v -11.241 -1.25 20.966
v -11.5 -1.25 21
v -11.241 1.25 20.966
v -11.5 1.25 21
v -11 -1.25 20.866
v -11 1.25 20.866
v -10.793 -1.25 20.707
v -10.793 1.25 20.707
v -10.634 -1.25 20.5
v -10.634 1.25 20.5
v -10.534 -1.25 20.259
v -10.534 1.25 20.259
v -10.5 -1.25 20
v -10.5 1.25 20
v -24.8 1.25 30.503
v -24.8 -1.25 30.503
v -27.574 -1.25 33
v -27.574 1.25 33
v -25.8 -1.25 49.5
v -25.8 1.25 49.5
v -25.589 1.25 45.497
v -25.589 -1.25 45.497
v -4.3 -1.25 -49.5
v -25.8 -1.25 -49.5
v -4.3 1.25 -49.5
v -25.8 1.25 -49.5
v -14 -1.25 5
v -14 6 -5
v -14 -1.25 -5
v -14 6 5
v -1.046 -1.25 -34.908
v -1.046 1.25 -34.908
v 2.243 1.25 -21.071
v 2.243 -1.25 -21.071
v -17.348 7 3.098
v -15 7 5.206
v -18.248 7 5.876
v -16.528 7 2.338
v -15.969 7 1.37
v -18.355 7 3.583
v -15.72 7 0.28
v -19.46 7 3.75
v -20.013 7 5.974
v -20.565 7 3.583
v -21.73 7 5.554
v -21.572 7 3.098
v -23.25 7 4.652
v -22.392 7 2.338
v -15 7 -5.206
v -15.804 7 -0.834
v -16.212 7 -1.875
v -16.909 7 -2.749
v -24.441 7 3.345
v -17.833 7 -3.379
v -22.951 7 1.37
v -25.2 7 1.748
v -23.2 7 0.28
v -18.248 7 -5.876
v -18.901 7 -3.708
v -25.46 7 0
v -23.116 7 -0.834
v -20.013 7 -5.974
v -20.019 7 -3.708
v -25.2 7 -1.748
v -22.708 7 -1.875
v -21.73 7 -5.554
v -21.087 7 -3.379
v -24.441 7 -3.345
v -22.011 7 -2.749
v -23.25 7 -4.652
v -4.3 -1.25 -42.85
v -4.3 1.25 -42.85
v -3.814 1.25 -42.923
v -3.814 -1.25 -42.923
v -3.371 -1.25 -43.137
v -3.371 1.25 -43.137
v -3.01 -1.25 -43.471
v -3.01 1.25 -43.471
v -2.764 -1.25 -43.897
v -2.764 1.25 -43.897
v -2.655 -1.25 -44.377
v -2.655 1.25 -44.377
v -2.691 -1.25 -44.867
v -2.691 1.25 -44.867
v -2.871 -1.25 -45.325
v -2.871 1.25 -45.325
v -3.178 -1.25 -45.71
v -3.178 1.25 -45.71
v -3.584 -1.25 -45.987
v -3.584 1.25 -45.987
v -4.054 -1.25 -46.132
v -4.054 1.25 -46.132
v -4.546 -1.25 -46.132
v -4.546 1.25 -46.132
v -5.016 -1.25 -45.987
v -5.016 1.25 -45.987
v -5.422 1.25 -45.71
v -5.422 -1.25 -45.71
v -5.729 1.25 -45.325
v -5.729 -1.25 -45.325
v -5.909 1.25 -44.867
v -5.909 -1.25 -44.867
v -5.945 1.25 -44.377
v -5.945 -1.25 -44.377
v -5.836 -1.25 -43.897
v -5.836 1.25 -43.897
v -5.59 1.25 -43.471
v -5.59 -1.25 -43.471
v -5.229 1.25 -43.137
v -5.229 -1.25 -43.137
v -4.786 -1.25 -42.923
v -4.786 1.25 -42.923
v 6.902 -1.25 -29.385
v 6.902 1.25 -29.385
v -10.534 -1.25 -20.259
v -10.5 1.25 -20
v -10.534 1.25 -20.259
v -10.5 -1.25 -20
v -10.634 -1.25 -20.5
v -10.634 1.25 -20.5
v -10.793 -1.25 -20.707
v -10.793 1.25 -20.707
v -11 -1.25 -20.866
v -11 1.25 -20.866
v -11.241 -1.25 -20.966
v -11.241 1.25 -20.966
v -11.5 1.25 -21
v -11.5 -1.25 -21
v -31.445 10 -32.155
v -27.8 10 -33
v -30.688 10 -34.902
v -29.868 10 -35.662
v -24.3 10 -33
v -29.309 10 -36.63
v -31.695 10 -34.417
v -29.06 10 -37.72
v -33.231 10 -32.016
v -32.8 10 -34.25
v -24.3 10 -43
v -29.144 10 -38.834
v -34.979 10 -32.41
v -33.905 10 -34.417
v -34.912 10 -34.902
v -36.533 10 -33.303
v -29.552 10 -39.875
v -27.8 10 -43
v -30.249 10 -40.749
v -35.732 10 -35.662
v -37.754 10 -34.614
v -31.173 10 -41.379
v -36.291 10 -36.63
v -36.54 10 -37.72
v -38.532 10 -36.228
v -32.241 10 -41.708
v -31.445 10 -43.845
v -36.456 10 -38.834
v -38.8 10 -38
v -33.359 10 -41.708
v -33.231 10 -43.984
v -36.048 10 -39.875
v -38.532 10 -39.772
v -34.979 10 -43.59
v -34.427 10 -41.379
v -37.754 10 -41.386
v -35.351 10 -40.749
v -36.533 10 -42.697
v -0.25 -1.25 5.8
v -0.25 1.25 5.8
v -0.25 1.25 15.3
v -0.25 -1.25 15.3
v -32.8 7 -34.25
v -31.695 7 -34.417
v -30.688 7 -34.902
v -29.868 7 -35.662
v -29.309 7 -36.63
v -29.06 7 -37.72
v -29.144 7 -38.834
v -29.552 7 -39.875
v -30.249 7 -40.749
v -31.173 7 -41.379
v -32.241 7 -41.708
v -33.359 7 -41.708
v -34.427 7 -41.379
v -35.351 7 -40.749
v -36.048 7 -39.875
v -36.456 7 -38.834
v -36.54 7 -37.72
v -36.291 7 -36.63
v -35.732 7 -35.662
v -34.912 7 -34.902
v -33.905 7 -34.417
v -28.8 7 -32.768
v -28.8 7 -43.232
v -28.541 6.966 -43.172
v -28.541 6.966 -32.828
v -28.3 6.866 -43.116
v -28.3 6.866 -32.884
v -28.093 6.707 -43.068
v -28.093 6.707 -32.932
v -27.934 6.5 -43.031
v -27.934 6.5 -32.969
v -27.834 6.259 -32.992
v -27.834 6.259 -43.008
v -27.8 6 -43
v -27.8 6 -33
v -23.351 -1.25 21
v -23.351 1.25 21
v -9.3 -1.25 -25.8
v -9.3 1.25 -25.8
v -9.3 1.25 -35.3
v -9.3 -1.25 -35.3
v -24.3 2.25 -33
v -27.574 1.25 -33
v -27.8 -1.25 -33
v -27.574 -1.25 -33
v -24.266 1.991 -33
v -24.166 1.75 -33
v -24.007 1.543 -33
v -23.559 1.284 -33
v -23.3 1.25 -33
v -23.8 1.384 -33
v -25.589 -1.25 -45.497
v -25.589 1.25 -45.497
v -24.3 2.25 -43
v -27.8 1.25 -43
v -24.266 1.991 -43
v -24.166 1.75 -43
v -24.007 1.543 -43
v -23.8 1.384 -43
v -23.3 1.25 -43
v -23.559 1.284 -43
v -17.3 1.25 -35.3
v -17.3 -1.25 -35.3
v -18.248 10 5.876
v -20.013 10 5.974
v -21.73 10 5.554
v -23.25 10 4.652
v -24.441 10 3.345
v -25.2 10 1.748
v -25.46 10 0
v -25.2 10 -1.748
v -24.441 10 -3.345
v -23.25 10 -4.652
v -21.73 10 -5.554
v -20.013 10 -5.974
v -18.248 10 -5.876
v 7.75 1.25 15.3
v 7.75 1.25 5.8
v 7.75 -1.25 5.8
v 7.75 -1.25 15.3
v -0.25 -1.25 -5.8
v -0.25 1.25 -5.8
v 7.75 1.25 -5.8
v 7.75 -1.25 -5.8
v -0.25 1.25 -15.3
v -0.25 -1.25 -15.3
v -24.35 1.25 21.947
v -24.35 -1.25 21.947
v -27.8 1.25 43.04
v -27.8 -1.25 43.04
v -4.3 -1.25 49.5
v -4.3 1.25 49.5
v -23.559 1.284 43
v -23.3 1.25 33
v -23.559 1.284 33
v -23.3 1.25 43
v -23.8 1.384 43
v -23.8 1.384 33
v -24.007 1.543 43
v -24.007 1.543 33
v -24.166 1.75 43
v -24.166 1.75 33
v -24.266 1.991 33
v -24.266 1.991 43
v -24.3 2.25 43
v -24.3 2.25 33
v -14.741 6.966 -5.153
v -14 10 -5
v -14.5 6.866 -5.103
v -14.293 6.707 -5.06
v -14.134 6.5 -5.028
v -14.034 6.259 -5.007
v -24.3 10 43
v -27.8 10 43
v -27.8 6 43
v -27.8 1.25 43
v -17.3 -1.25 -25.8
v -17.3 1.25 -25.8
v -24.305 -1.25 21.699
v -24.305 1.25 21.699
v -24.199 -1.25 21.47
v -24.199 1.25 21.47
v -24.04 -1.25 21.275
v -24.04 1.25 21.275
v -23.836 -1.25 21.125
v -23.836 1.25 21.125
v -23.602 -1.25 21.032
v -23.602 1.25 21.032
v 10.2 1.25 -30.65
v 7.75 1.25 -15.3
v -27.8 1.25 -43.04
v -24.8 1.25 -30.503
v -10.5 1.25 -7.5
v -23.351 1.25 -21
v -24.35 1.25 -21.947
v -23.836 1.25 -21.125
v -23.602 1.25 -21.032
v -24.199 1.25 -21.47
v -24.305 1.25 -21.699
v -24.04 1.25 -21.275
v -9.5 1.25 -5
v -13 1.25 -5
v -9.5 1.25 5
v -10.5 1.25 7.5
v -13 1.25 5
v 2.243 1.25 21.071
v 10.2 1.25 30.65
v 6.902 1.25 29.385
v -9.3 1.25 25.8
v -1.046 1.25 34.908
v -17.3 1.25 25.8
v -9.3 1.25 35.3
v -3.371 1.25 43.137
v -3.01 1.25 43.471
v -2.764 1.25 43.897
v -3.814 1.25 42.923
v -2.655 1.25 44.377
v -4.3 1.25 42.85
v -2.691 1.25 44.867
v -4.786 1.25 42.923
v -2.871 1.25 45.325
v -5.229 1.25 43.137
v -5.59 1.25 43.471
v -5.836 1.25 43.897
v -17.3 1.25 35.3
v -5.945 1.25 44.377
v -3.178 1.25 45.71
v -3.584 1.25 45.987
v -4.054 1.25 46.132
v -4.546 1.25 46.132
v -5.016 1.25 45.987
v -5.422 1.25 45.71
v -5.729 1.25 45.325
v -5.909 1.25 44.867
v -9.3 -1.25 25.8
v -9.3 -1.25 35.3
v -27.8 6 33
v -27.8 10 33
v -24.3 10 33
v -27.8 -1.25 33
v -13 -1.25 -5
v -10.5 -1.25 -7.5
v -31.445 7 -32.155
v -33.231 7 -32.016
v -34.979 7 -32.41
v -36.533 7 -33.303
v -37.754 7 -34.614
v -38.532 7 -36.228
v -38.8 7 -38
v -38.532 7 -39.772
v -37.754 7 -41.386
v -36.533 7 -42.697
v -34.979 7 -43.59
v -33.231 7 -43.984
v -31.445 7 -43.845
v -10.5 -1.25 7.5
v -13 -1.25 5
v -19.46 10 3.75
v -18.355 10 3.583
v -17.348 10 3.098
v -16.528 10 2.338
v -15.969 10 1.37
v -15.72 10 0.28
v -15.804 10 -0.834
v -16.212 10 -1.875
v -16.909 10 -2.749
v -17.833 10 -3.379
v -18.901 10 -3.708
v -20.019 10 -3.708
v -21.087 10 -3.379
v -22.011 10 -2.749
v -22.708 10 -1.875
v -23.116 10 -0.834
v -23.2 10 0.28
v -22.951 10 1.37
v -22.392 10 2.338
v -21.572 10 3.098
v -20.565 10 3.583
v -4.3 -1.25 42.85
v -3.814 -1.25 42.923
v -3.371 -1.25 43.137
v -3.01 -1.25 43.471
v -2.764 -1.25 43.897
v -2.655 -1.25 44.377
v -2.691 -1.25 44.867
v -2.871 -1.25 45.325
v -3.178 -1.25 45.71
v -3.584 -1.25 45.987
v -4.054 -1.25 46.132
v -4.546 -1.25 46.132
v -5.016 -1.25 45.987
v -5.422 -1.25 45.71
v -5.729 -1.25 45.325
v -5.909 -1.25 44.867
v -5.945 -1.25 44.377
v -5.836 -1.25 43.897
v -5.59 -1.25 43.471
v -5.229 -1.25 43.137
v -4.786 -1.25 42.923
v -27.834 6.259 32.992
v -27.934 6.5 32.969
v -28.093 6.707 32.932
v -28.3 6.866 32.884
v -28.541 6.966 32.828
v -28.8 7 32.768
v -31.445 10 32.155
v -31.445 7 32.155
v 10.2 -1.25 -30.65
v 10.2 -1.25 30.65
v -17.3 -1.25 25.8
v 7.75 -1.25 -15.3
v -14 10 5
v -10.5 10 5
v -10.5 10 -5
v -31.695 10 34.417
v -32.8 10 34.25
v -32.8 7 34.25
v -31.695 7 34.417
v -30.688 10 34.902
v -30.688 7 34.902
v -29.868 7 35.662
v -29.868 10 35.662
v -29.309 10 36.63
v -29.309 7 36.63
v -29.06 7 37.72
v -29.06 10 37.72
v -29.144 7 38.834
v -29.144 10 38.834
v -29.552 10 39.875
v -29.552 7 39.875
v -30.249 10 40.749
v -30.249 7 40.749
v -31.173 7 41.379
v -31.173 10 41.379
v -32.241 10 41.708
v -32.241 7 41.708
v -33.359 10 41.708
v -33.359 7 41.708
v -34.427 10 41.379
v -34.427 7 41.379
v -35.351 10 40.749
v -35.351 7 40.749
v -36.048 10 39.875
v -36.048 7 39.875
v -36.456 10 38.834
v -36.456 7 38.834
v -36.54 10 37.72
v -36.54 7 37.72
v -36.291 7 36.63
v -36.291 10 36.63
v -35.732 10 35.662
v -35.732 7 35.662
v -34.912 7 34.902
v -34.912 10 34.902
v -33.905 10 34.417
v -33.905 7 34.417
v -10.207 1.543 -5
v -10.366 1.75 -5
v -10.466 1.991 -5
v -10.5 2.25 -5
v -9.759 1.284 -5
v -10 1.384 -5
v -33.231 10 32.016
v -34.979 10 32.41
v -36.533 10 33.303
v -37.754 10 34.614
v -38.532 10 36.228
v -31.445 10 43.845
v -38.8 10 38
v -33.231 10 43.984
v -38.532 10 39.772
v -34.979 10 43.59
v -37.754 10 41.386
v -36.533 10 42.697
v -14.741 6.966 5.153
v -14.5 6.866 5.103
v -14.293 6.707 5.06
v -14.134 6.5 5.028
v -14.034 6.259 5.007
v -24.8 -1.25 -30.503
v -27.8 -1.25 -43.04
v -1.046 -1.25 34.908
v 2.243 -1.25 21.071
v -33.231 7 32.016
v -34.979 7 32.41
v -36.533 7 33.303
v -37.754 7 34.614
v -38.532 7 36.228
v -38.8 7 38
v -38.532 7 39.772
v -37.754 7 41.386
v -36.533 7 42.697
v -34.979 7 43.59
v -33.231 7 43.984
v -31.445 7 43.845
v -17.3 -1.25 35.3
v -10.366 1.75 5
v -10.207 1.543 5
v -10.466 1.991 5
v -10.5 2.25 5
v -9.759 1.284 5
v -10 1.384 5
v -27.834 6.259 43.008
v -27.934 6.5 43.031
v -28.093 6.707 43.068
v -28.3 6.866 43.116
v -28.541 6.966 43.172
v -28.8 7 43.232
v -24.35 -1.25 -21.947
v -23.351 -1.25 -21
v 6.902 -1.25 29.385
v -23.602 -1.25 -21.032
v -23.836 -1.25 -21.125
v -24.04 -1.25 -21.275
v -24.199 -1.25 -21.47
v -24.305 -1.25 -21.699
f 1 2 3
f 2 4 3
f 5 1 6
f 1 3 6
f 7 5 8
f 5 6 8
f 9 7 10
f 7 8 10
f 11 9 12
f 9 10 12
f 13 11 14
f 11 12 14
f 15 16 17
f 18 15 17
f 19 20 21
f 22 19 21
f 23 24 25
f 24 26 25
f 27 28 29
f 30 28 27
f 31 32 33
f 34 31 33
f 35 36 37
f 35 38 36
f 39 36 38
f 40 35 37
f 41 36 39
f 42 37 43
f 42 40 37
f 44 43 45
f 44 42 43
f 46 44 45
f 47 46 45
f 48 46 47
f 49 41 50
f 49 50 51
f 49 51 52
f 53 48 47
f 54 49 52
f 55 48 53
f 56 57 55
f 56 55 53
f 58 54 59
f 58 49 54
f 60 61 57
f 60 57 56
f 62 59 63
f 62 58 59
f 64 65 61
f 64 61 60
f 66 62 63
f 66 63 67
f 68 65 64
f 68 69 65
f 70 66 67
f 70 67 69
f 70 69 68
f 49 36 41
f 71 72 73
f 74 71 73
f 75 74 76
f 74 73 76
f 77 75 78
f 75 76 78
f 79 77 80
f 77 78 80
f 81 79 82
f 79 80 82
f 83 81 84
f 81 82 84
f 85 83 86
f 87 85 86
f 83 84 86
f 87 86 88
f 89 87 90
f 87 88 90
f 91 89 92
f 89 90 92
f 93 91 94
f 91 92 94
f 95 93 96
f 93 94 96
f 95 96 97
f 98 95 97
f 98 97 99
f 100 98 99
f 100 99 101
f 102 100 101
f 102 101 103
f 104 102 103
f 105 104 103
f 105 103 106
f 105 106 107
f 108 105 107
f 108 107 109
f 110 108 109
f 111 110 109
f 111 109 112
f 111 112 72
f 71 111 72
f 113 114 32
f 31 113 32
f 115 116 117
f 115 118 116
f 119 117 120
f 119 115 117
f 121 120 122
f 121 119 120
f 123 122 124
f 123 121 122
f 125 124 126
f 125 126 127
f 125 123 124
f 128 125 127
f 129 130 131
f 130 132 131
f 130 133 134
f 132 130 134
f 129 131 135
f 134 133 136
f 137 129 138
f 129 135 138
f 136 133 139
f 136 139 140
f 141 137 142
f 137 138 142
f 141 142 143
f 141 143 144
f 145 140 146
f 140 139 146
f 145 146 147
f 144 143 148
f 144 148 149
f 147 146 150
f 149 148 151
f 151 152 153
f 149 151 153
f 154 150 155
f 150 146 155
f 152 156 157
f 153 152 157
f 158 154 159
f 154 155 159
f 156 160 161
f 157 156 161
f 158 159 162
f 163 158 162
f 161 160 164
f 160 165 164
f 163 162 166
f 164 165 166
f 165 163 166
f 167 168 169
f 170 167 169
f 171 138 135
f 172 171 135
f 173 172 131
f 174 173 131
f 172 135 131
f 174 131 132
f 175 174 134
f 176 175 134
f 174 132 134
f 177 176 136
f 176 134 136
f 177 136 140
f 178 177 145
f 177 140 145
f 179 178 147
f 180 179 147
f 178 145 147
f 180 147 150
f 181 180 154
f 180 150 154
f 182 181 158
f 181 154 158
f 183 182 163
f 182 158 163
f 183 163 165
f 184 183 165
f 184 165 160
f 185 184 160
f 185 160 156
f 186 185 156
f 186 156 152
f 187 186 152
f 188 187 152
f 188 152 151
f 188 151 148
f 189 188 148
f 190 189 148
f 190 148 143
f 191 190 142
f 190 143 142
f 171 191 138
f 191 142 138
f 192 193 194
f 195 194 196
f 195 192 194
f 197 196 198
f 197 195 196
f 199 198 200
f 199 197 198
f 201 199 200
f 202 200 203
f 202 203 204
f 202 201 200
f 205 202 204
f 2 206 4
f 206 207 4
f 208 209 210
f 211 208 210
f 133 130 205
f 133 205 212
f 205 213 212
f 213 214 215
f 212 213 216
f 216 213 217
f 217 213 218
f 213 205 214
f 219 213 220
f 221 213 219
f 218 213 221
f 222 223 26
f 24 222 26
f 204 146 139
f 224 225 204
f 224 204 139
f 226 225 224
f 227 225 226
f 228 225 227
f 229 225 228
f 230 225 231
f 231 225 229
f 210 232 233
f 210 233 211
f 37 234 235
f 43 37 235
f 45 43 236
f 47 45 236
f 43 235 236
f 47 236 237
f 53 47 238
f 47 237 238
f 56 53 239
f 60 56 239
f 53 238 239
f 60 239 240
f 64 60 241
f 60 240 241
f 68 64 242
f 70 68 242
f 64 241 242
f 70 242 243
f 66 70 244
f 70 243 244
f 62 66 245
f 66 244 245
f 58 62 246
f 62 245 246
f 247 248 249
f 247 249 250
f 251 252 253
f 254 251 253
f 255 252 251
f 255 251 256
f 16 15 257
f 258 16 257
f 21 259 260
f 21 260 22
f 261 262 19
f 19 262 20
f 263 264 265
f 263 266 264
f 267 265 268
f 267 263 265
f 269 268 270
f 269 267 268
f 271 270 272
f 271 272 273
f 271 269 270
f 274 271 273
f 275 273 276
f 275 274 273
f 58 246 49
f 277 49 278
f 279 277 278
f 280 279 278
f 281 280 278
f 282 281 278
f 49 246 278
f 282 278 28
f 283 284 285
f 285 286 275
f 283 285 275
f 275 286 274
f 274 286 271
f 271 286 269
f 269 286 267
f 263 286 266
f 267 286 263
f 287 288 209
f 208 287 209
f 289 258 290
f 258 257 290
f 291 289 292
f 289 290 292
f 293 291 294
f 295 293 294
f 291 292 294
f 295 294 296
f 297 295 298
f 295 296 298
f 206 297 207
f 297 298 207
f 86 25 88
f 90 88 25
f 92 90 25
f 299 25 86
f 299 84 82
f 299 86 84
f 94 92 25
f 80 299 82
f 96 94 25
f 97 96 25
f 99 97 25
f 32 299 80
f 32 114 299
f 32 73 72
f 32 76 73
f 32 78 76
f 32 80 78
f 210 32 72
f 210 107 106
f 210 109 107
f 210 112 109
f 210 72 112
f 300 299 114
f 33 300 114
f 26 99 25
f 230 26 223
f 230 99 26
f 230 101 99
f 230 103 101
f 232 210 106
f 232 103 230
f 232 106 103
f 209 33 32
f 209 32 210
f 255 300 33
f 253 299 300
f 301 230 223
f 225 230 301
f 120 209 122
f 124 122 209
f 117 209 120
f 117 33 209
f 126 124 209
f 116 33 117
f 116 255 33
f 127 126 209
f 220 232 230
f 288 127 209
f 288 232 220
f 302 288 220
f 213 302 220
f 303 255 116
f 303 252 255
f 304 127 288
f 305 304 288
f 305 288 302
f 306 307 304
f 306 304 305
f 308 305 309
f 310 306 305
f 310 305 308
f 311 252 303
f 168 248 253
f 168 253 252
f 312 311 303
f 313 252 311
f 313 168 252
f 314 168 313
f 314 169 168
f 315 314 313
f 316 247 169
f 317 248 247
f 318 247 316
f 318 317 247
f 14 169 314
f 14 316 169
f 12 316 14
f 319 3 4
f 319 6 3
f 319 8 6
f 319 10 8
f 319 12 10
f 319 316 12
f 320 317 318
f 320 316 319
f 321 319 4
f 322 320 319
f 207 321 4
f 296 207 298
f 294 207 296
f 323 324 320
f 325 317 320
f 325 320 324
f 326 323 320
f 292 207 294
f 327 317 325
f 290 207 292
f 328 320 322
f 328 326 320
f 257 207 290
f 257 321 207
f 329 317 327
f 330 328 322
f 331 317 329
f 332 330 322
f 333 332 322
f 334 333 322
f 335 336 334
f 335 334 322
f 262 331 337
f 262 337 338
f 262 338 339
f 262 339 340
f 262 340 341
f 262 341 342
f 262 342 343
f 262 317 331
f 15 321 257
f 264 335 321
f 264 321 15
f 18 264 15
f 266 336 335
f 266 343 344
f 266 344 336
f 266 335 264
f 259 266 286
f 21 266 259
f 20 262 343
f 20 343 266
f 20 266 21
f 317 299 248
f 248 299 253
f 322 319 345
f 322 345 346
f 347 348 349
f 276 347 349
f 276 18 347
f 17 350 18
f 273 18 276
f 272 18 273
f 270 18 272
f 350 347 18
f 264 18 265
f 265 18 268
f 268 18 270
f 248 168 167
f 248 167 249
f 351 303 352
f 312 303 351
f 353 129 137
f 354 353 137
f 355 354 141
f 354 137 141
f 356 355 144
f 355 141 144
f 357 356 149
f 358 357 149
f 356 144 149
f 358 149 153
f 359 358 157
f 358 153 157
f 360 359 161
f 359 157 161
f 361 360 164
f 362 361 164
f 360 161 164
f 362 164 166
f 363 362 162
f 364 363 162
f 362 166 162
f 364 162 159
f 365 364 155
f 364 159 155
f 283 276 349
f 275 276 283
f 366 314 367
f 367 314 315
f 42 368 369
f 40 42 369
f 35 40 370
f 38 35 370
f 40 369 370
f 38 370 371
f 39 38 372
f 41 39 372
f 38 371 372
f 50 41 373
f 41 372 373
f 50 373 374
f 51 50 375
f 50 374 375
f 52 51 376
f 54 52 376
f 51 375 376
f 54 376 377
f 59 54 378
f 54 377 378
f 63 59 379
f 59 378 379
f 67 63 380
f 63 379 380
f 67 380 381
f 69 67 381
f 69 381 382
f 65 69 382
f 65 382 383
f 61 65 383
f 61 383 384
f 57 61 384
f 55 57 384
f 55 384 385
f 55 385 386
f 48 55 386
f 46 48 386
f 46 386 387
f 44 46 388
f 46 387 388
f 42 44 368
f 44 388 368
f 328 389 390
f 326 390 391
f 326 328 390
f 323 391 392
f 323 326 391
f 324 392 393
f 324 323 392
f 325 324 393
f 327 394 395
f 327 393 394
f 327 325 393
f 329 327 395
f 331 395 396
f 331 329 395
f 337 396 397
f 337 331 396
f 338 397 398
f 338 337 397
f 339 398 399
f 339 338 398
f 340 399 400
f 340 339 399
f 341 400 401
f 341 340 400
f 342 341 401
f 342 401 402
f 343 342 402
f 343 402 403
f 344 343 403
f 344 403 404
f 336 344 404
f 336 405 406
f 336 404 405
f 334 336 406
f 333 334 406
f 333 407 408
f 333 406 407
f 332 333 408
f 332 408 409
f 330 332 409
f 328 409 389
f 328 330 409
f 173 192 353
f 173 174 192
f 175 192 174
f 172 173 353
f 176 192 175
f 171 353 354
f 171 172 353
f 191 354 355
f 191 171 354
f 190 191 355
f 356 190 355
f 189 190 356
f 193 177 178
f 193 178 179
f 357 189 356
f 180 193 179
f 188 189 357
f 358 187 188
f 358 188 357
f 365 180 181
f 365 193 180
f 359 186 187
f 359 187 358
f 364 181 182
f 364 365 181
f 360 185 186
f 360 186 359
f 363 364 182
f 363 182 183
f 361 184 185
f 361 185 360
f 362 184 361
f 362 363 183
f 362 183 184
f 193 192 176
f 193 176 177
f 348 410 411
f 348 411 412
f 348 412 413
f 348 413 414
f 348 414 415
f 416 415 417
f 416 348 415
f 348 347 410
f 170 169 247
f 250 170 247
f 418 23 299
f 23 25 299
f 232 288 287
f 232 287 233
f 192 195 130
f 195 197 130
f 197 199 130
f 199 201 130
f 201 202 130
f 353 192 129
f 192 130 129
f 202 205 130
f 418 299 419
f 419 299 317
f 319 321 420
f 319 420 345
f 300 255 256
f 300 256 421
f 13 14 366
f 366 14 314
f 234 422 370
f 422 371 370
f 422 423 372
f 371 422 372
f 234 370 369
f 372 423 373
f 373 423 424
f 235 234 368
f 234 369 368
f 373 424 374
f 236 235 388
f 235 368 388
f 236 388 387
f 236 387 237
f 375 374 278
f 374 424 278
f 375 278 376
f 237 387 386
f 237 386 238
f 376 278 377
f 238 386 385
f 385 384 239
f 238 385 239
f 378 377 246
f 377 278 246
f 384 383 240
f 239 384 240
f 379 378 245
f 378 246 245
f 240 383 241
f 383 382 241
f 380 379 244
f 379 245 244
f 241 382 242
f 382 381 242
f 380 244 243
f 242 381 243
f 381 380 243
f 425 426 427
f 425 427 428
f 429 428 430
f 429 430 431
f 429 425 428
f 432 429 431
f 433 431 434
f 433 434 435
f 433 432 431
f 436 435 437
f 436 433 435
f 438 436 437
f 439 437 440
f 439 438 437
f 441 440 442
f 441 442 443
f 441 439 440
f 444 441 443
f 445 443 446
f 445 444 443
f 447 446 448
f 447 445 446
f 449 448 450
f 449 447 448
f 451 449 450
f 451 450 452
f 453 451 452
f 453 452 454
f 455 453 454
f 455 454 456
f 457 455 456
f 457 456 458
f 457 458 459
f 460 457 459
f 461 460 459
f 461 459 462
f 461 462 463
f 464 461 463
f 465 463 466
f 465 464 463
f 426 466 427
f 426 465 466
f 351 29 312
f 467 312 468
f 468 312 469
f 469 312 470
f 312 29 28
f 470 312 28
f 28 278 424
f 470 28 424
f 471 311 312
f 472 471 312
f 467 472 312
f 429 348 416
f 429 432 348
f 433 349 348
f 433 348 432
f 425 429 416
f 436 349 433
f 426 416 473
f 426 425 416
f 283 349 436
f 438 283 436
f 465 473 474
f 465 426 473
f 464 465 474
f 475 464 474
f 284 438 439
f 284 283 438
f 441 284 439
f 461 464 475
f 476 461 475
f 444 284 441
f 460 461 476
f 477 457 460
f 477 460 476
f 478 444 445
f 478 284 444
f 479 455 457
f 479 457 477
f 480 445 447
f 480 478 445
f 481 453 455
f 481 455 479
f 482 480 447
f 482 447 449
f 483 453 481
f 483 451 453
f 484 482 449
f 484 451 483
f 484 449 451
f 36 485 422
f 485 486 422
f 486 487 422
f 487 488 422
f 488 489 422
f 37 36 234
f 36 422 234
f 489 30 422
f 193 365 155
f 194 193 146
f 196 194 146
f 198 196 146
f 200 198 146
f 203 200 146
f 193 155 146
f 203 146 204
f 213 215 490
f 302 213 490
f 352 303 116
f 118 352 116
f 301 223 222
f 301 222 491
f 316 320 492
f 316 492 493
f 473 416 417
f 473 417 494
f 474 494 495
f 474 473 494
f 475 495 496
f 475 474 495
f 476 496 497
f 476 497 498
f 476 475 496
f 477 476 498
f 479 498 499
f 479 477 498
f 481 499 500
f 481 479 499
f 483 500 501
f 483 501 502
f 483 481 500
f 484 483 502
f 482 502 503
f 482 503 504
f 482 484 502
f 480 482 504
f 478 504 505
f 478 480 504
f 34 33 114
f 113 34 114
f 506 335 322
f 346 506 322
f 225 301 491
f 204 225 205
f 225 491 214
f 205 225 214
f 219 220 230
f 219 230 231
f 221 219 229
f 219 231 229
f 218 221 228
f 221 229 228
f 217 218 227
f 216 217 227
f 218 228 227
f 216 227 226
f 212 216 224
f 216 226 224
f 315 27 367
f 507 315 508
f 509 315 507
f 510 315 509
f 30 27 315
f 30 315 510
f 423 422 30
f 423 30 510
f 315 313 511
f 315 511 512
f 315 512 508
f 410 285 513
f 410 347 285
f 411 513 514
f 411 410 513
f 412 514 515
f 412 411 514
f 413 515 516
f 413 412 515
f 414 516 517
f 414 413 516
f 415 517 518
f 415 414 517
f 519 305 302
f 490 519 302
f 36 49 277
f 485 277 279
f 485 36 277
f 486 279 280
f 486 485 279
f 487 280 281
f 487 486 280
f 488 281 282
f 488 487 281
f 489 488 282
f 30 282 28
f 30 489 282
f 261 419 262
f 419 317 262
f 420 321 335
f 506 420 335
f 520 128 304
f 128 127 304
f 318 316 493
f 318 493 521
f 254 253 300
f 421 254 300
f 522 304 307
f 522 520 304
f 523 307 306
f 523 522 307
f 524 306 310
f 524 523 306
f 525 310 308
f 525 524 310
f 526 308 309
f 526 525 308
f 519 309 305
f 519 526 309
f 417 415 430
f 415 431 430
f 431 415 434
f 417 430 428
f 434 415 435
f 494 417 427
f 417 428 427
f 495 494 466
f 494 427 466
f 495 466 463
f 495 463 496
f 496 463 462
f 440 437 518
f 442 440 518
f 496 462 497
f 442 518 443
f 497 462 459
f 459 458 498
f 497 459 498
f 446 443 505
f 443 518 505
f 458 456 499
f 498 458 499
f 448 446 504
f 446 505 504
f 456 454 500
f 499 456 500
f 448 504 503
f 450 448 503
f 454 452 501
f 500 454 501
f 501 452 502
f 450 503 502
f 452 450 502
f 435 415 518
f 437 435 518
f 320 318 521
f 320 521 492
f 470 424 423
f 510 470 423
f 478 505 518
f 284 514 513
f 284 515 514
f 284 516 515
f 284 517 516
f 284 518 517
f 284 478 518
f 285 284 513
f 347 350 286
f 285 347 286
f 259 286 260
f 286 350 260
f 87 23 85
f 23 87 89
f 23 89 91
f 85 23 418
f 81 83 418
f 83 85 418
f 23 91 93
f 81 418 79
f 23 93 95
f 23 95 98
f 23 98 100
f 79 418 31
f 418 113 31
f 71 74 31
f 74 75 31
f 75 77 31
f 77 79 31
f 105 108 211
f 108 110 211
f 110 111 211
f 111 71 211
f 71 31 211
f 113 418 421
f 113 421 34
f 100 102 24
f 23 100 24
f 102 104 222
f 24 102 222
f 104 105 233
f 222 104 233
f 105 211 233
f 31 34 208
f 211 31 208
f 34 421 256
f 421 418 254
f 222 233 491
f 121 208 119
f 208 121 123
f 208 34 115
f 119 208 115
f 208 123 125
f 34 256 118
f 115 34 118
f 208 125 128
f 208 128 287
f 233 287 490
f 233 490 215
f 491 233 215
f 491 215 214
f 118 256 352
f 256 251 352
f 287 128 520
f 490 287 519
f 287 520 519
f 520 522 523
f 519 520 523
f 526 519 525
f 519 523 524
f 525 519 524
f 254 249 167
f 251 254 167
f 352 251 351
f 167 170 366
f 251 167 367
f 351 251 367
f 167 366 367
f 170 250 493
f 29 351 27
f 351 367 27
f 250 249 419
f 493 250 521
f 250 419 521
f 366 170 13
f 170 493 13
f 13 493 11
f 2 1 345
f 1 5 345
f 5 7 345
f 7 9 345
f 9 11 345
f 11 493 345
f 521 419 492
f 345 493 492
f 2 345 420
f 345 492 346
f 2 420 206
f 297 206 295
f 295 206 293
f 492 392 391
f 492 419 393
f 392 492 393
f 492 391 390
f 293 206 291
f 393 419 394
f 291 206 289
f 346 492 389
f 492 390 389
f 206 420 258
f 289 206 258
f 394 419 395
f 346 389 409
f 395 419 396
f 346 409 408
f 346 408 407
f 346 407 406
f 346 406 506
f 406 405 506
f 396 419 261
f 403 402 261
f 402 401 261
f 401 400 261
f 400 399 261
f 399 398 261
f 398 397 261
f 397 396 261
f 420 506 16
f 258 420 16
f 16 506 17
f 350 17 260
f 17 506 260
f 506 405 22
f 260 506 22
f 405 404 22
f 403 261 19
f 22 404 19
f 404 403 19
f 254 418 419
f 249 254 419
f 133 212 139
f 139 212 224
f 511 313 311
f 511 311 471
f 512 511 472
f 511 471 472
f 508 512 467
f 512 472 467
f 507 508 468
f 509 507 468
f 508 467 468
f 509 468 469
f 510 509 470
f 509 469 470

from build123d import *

# Parameters (mm, degrees)
RESSALTO_EXTRUS_O1_DEPTH = 1.25
ESBO_O8_R                = 1.65
ESBO_O8_W                = 8
ESBO_O8_H                = 9.5
CORTE_EXTRUS_O6_DEPTH    = 56.876112964
CORTE_EXTRUS_O5_DEPTH    = 10
RESSALTO_EXTRUS_O4_START = -1.25
ESBO_O12_W               = 3.5
ESBO_O12_H               = 10
RESSALTO_EXTRUS_O4_DEPTH = 11.25
ESBO_O13_R               = 3.75
RESSALTO_EXTRUS_O5_DEPTH = 3
RESSALTO_EXTRUS_O6_START = -11.25
ESBO_O14_W               = 3.5
ESBO_O14_H               = 10
RESSALTO_EXTRUS_O6_DEPTH = 11.25
ESBO_O15_R               = 3.75
RESSALTO_EXTRUS_O7_DEPTH = 3
CHANFRO1_SIZE            = 2.5
CHANFRO1_SIZE_2          = 2.378287199
CHANFRO1_SIZE_3          = 2.642541332
FILETE1_R                = 1


with BuildPart() as part:
    # Esboço1 → Ressalto-extrusão1 (new, symmetric)
    with BuildSketch(Plane(origin=(0, 0, 0), x_dir=(1, 0, 0), z_dir=(0, 1, 0))):
        Polygon((-10.5, -21), (-10.5, 21), (-24.3, 21), (-25.8, 49.5), (-4.3, 49.5), (10.2, 30.65), (10.2, -30.65), (-4.3, -49.5), (-25.8, -49.5), (-24.3, -21), align=None)
    extrude(amount=RESSALTO_EXTRUS_O1_DEPTH, both=True)

    # Esboço8 → Corte-extrusão6 (cut, through all)
    with BuildSketch(Plane(origin=(0, 1.25, 0), x_dir=(1, 0, 0), z_dir=(0, 1, 0))):
        with Locations(Location((-4.3, 44.5, 0), (0, 0, 270))):
            Circle(ESBO_O8_R)
        with Locations((-13.3, 30.55)):
            Rectangle(ESBO_O8_W, ESBO_O8_H)
        with Locations((3.75, 10.55)):
            Rectangle(ESBO_O8_W, ESBO_O8_H)
    corte_extrus_o6 = extrude(amount=-CORTE_EXTRUS_O6_DEPTH, mode=Mode.SUBTRACT)

    # Esboço9 → Corte-extrusão5 (cut)
    with BuildSketch(Plane(origin=(0, 1.25, 0), x_dir=(1, 0, 0), z_dir=(0, 1, 0))):
        Polygon((6.901537023, 29.384909169), (-1.046130524, 34.9078029), (2.24312, 21.07143213), align=None)
    corte_extrus_o5 = extrude(amount=-CORTE_EXTRUS_O5_DEPTH, mode=Mode.SUBTRACT)

    # Esboço12 → Ressalto-extrusão4 (add)
    with BuildSketch(Plane(origin=(0, 0, 0), x_dir=(1, 0, 0), z_dir=(0, 1, 0)).offset(RESSALTO_EXTRUS_O4_START)):
        with Locations((-26.05, 38)):
            Rectangle(ESBO_O12_W, ESBO_O12_H)
    ressalto_extrus_o4 = extrude(amount=RESSALTO_EXTRUS_O4_DEPTH)

    # Esboço13 → Ressalto-extrusão5 (add)
    with BuildSketch(Plane(origin=(0, 10, 0), x_dir=(1, 0, 0), z_dir=(0, 1, 0))):
        with BuildLine():
            Line((-31.444994432, 43.844994432), (-27.8, 43))
            Line((-27.8, 43), (-27.8, 33))
            Line((-27.8, 33), (-31.444994432, 32.155005568))
            ThreePointArc((-31.444994432, 32.155005568), (-38.8, 38), (-31.444994432, 43.844994432))
        make_face()
        with Locations(Location((-32.8, 38, 0), (0, 0, 270))):
            Circle(ESBO_O13_R, mode=Mode.SUBTRACT)
    ressalto_extrus_o5 = extrude(amount=-RESSALTO_EXTRUS_O5_DEPTH)

    # Espelhar1: Corte-extrusão6, Corte-extrusão5, Ressalto-extrusão4, Ressalto-extrusão5 across plane
    add(corte_extrus_o6.mirror(Plane.XY), mode=Mode.SUBTRACT)
    add(corte_extrus_o5.mirror(Plane.XY), mode=Mode.SUBTRACT)
    add(ressalto_extrus_o4.mirror(Plane.XY))
    add(ressalto_extrus_o5.mirror(Plane.XY))

    # Esboço14 → Ressalto-extrusão6 (add)
    with BuildSketch(Plane.XZ.offset(1.25).offset(RESSALTO_EXTRUS_O6_START)):
        with Locations((-12.25, 0)):
            Rectangle(ESBO_O14_W, ESBO_O14_H)
    extrude(amount=RESSALTO_EXTRUS_O6_DEPTH)

    # Esboço15 → Ressalto-extrusão7 (add)
    with BuildSketch(Plane(origin=(0, 10, 0), x_dir=(1, 0, 0), z_dir=(0, 1, 0))):
        with BuildLine():
            Line((-18.247793537, 5.876270543), (-14, 5))
            Line((-14, 5), (-14, -5))
            Line((-14, -5), (-18.247793537, -5.876270543))
            ThreePointArc((-18.247793537, -5.876270543), (-25.46, 0), (-18.247793537, 5.876270543))
        make_face()
        with Locations(Location((-19.46, 0, 0), (0, 0, 270))):
            Circle(ESBO_O15_R, mode=Mode.SUBTRACT)
    extrude(amount=-RESSALTO_EXTRUS_O7_DEPTH)

    # Chanfro1
    # the kernel refuses this chamfer: 2.642541332, 2.5, 2.378287199 mm, written as the material it adds along each edge
    with BuildSketch(Plane(origin=(-10.5, 1.25, -5), x_dir=(0.02749587661058631, 0, -0.9996219169112968), z_dir=(0, -1, 0))) as chanfro1_piece_1:
        Polygon((CHANFRO1_SIZE * 0.999621916911, -CHANFRO1_SIZE * 0.0274958766106), (-CHANFRO1_SIZE * 0.0274958766106, -CHANFRO1_SIZE * 0.999621916911), (0, 0), align=None)
    extrude(amount=2.5)
    with BuildSketch(Plane(origin=(-10.5, 1.25, 5), x_dir=(0.02749587661058631, 0, 0.9996219169112968), z_dir=(0, -1, 0))) as chanfro1_piece_2:
        Polygon((CHANFRO1_SIZE * 0.999621916911, CHANFRO1_SIZE * 0.0274958766106), (-CHANFRO1_SIZE * 0.0274958766106, CHANFRO1_SIZE * 0.999621916911), (0, 0), align=None)
    extrude(amount=2.5)
    with BuildSketch(Plane(origin=(-25.457894737, 1.25, 43), x_dir=(-0.9995382917887814, 0, -0.03038425987192659), z_dir=(0, -1, 0))) as chanfro1_piece_3_section:
        Polygon((CHANFRO1_SIZE_2 * 0.999538291707, -CHANFRO1_SIZE_2 * 0.0303842598694), (CHANFRO1_SIZE * 0.0221923026388, -CHANFRO1_SIZE * 0.999753720525), (0, 0), align=None)
    chanfro1_piece_3 = extrude(amount=2.5, mode=Mode.PRIVATE)
    chanfro1_piece_3 = split(chanfro1_piece_3, bisect_by=Plane(origin=(-27.8, 0, 43.832382162), z_dir=(1, 0, 0)), keep=Keep.TOP, mode=Mode.PRIVATE)
    add(chanfro1_piece_3)
    with BuildSketch(Plane(origin=(-24.931578947, -1.25, 33), x_dir=(0.0815134342344048, 0, -0.9966722430364525), z_dir=(0, 1, 0))) as chanfro1_piece_4:
        Polygon((CHANFRO1_SIZE * 0.999578922884, CHANFRO1_SIZE * 0.0290168386568), (-CHANFRO1_SIZE_3 * 0.0815134342346, CHANFRO1_SIZE_3 * 0.996672243039), (0, 0), align=None)
    extrude(amount=2.5)
    with BuildSketch(Plane(origin=(-25.457894737, 1.25, -43), x_dir=(-0.025081088900339724, 0, -0.9996854200095016), z_dir=(0, -1, 0))) as chanfro1_piece_5_section:
        Polygon((CHANFRO1_SIZE * 0.999621916911, -CHANFRO1_SIZE * 0.0274958766106), (CHANFRO1_SIZE_2 * 0.0250810888983, -CHANFRO1_SIZE_2 * 0.999685419928), (0, 0), align=None)
    chanfro1_piece_5 = extrude(amount=2.5, mode=Mode.PRIVATE)
    chanfro1_piece_5 = split(chanfro1_piece_5, bisect_by=Plane(origin=(-27.8, 0, -43.832382162), z_dir=(1, 0, 0)), keep=Keep.TOP, mode=Mode.PRIVATE)
    add(chanfro1_piece_5)
    with BuildSketch(Plane(origin=(-24.931578947, -1.25, -33), x_dir=(-0.9996625353173835, 0, -0.0259772108360549), z_dir=(0, 1, 0))) as chanfro1_piece_6:
        Polygon((CHANFRO1_SIZE_3 * 0.99966253532, CHANFRO1_SIZE_3 * 0.0259772108361), (-CHANFRO1_SIZE * 0.07848240227, CHANFRO1_SIZE * 0.996915499194), (0, 0), align=None)
    extrude(amount=2.5)

    # Filete1
    filete1_edges = [part.edges().sort_by_distance(p)[0] for p in [
        (-27.8, 7, -38),
        (-14, 7, 0),
        (-27.8, 7, 38),
        (-24.3, 1.25, -38),
        (-10.5, 1.25, 0),
        (-24.3, 1.25, 38),
        (-24.3, 0, 21),
        (-10.5, 0, 21),
        (-10.5, 0, -21),
        (-24.3, 0, -21),
    ]]
    fillet(filete1_edges, radius=FILETE1_R)


solid = part.part
